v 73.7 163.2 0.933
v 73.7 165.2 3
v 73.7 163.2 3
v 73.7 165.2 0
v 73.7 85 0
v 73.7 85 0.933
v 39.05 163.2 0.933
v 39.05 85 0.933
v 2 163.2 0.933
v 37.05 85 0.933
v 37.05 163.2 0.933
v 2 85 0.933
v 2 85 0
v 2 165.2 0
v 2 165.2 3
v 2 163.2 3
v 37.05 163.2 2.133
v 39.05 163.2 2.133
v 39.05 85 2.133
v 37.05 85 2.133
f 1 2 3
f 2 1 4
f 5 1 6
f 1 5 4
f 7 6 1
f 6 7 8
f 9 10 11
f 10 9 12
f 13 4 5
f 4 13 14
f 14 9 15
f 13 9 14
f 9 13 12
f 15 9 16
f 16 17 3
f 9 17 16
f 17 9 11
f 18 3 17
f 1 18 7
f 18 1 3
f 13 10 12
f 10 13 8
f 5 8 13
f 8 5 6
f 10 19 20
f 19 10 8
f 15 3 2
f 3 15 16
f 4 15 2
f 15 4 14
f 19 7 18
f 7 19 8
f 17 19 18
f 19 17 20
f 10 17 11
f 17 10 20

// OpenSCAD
fn = 20;

test = 0; //test piece = 1, real piece = 0;

innerLength = 72.1; // 2.8" holder length (+ to - of battery)
innerWidth = 74.2; // 2.82" from battery to battery
innerHeight = (test) ? 20 : 109.68 ; //3 batteries stand 4.3" tall
wall = 2; //wall thickness
tol = .4; //tolerance

module DCell (){
	bottom = (test) ? wall/1.5 : wall/1.5; //bottom thickness
	difference(){
		cube([innerLength+ (wall*2), innerWidth + (wall*2), innerHeight + (wall*3)]); 
		translate([wall, wall, bottom])cube([innerLength, innerWidth, innerHeight+40]); //main cavity
		translate([(wall), (-wall),innerHeight+(wall/2)])cube([innerLength, innerWidth+(wall*4.5),wall/1.5]); //slot
		translate([innerLength/2 + (wall/2)-(tol/2),0,innerHeight-(wall/2)+tol])cube([wall+tol,innerWidth+(wall*4.5),wall]); //T-slot
	}
}

module Cover (){
	translate([2,85,0])cube([innerLength-tol,innerWidth+(wall*2),wall/1.5-tol]); //plate
	translate([2,85+innerWidth+(wall*2),0])cube([innerLength-tol,wall,wall*1.5]); //lip
	translate([innerLength/2 + wall/2,85,wall/1.5-tol])cube([wall,innerWidth+(wall*2),wall-tol*2]); //T-slot
}

//DCell();
Cover();
